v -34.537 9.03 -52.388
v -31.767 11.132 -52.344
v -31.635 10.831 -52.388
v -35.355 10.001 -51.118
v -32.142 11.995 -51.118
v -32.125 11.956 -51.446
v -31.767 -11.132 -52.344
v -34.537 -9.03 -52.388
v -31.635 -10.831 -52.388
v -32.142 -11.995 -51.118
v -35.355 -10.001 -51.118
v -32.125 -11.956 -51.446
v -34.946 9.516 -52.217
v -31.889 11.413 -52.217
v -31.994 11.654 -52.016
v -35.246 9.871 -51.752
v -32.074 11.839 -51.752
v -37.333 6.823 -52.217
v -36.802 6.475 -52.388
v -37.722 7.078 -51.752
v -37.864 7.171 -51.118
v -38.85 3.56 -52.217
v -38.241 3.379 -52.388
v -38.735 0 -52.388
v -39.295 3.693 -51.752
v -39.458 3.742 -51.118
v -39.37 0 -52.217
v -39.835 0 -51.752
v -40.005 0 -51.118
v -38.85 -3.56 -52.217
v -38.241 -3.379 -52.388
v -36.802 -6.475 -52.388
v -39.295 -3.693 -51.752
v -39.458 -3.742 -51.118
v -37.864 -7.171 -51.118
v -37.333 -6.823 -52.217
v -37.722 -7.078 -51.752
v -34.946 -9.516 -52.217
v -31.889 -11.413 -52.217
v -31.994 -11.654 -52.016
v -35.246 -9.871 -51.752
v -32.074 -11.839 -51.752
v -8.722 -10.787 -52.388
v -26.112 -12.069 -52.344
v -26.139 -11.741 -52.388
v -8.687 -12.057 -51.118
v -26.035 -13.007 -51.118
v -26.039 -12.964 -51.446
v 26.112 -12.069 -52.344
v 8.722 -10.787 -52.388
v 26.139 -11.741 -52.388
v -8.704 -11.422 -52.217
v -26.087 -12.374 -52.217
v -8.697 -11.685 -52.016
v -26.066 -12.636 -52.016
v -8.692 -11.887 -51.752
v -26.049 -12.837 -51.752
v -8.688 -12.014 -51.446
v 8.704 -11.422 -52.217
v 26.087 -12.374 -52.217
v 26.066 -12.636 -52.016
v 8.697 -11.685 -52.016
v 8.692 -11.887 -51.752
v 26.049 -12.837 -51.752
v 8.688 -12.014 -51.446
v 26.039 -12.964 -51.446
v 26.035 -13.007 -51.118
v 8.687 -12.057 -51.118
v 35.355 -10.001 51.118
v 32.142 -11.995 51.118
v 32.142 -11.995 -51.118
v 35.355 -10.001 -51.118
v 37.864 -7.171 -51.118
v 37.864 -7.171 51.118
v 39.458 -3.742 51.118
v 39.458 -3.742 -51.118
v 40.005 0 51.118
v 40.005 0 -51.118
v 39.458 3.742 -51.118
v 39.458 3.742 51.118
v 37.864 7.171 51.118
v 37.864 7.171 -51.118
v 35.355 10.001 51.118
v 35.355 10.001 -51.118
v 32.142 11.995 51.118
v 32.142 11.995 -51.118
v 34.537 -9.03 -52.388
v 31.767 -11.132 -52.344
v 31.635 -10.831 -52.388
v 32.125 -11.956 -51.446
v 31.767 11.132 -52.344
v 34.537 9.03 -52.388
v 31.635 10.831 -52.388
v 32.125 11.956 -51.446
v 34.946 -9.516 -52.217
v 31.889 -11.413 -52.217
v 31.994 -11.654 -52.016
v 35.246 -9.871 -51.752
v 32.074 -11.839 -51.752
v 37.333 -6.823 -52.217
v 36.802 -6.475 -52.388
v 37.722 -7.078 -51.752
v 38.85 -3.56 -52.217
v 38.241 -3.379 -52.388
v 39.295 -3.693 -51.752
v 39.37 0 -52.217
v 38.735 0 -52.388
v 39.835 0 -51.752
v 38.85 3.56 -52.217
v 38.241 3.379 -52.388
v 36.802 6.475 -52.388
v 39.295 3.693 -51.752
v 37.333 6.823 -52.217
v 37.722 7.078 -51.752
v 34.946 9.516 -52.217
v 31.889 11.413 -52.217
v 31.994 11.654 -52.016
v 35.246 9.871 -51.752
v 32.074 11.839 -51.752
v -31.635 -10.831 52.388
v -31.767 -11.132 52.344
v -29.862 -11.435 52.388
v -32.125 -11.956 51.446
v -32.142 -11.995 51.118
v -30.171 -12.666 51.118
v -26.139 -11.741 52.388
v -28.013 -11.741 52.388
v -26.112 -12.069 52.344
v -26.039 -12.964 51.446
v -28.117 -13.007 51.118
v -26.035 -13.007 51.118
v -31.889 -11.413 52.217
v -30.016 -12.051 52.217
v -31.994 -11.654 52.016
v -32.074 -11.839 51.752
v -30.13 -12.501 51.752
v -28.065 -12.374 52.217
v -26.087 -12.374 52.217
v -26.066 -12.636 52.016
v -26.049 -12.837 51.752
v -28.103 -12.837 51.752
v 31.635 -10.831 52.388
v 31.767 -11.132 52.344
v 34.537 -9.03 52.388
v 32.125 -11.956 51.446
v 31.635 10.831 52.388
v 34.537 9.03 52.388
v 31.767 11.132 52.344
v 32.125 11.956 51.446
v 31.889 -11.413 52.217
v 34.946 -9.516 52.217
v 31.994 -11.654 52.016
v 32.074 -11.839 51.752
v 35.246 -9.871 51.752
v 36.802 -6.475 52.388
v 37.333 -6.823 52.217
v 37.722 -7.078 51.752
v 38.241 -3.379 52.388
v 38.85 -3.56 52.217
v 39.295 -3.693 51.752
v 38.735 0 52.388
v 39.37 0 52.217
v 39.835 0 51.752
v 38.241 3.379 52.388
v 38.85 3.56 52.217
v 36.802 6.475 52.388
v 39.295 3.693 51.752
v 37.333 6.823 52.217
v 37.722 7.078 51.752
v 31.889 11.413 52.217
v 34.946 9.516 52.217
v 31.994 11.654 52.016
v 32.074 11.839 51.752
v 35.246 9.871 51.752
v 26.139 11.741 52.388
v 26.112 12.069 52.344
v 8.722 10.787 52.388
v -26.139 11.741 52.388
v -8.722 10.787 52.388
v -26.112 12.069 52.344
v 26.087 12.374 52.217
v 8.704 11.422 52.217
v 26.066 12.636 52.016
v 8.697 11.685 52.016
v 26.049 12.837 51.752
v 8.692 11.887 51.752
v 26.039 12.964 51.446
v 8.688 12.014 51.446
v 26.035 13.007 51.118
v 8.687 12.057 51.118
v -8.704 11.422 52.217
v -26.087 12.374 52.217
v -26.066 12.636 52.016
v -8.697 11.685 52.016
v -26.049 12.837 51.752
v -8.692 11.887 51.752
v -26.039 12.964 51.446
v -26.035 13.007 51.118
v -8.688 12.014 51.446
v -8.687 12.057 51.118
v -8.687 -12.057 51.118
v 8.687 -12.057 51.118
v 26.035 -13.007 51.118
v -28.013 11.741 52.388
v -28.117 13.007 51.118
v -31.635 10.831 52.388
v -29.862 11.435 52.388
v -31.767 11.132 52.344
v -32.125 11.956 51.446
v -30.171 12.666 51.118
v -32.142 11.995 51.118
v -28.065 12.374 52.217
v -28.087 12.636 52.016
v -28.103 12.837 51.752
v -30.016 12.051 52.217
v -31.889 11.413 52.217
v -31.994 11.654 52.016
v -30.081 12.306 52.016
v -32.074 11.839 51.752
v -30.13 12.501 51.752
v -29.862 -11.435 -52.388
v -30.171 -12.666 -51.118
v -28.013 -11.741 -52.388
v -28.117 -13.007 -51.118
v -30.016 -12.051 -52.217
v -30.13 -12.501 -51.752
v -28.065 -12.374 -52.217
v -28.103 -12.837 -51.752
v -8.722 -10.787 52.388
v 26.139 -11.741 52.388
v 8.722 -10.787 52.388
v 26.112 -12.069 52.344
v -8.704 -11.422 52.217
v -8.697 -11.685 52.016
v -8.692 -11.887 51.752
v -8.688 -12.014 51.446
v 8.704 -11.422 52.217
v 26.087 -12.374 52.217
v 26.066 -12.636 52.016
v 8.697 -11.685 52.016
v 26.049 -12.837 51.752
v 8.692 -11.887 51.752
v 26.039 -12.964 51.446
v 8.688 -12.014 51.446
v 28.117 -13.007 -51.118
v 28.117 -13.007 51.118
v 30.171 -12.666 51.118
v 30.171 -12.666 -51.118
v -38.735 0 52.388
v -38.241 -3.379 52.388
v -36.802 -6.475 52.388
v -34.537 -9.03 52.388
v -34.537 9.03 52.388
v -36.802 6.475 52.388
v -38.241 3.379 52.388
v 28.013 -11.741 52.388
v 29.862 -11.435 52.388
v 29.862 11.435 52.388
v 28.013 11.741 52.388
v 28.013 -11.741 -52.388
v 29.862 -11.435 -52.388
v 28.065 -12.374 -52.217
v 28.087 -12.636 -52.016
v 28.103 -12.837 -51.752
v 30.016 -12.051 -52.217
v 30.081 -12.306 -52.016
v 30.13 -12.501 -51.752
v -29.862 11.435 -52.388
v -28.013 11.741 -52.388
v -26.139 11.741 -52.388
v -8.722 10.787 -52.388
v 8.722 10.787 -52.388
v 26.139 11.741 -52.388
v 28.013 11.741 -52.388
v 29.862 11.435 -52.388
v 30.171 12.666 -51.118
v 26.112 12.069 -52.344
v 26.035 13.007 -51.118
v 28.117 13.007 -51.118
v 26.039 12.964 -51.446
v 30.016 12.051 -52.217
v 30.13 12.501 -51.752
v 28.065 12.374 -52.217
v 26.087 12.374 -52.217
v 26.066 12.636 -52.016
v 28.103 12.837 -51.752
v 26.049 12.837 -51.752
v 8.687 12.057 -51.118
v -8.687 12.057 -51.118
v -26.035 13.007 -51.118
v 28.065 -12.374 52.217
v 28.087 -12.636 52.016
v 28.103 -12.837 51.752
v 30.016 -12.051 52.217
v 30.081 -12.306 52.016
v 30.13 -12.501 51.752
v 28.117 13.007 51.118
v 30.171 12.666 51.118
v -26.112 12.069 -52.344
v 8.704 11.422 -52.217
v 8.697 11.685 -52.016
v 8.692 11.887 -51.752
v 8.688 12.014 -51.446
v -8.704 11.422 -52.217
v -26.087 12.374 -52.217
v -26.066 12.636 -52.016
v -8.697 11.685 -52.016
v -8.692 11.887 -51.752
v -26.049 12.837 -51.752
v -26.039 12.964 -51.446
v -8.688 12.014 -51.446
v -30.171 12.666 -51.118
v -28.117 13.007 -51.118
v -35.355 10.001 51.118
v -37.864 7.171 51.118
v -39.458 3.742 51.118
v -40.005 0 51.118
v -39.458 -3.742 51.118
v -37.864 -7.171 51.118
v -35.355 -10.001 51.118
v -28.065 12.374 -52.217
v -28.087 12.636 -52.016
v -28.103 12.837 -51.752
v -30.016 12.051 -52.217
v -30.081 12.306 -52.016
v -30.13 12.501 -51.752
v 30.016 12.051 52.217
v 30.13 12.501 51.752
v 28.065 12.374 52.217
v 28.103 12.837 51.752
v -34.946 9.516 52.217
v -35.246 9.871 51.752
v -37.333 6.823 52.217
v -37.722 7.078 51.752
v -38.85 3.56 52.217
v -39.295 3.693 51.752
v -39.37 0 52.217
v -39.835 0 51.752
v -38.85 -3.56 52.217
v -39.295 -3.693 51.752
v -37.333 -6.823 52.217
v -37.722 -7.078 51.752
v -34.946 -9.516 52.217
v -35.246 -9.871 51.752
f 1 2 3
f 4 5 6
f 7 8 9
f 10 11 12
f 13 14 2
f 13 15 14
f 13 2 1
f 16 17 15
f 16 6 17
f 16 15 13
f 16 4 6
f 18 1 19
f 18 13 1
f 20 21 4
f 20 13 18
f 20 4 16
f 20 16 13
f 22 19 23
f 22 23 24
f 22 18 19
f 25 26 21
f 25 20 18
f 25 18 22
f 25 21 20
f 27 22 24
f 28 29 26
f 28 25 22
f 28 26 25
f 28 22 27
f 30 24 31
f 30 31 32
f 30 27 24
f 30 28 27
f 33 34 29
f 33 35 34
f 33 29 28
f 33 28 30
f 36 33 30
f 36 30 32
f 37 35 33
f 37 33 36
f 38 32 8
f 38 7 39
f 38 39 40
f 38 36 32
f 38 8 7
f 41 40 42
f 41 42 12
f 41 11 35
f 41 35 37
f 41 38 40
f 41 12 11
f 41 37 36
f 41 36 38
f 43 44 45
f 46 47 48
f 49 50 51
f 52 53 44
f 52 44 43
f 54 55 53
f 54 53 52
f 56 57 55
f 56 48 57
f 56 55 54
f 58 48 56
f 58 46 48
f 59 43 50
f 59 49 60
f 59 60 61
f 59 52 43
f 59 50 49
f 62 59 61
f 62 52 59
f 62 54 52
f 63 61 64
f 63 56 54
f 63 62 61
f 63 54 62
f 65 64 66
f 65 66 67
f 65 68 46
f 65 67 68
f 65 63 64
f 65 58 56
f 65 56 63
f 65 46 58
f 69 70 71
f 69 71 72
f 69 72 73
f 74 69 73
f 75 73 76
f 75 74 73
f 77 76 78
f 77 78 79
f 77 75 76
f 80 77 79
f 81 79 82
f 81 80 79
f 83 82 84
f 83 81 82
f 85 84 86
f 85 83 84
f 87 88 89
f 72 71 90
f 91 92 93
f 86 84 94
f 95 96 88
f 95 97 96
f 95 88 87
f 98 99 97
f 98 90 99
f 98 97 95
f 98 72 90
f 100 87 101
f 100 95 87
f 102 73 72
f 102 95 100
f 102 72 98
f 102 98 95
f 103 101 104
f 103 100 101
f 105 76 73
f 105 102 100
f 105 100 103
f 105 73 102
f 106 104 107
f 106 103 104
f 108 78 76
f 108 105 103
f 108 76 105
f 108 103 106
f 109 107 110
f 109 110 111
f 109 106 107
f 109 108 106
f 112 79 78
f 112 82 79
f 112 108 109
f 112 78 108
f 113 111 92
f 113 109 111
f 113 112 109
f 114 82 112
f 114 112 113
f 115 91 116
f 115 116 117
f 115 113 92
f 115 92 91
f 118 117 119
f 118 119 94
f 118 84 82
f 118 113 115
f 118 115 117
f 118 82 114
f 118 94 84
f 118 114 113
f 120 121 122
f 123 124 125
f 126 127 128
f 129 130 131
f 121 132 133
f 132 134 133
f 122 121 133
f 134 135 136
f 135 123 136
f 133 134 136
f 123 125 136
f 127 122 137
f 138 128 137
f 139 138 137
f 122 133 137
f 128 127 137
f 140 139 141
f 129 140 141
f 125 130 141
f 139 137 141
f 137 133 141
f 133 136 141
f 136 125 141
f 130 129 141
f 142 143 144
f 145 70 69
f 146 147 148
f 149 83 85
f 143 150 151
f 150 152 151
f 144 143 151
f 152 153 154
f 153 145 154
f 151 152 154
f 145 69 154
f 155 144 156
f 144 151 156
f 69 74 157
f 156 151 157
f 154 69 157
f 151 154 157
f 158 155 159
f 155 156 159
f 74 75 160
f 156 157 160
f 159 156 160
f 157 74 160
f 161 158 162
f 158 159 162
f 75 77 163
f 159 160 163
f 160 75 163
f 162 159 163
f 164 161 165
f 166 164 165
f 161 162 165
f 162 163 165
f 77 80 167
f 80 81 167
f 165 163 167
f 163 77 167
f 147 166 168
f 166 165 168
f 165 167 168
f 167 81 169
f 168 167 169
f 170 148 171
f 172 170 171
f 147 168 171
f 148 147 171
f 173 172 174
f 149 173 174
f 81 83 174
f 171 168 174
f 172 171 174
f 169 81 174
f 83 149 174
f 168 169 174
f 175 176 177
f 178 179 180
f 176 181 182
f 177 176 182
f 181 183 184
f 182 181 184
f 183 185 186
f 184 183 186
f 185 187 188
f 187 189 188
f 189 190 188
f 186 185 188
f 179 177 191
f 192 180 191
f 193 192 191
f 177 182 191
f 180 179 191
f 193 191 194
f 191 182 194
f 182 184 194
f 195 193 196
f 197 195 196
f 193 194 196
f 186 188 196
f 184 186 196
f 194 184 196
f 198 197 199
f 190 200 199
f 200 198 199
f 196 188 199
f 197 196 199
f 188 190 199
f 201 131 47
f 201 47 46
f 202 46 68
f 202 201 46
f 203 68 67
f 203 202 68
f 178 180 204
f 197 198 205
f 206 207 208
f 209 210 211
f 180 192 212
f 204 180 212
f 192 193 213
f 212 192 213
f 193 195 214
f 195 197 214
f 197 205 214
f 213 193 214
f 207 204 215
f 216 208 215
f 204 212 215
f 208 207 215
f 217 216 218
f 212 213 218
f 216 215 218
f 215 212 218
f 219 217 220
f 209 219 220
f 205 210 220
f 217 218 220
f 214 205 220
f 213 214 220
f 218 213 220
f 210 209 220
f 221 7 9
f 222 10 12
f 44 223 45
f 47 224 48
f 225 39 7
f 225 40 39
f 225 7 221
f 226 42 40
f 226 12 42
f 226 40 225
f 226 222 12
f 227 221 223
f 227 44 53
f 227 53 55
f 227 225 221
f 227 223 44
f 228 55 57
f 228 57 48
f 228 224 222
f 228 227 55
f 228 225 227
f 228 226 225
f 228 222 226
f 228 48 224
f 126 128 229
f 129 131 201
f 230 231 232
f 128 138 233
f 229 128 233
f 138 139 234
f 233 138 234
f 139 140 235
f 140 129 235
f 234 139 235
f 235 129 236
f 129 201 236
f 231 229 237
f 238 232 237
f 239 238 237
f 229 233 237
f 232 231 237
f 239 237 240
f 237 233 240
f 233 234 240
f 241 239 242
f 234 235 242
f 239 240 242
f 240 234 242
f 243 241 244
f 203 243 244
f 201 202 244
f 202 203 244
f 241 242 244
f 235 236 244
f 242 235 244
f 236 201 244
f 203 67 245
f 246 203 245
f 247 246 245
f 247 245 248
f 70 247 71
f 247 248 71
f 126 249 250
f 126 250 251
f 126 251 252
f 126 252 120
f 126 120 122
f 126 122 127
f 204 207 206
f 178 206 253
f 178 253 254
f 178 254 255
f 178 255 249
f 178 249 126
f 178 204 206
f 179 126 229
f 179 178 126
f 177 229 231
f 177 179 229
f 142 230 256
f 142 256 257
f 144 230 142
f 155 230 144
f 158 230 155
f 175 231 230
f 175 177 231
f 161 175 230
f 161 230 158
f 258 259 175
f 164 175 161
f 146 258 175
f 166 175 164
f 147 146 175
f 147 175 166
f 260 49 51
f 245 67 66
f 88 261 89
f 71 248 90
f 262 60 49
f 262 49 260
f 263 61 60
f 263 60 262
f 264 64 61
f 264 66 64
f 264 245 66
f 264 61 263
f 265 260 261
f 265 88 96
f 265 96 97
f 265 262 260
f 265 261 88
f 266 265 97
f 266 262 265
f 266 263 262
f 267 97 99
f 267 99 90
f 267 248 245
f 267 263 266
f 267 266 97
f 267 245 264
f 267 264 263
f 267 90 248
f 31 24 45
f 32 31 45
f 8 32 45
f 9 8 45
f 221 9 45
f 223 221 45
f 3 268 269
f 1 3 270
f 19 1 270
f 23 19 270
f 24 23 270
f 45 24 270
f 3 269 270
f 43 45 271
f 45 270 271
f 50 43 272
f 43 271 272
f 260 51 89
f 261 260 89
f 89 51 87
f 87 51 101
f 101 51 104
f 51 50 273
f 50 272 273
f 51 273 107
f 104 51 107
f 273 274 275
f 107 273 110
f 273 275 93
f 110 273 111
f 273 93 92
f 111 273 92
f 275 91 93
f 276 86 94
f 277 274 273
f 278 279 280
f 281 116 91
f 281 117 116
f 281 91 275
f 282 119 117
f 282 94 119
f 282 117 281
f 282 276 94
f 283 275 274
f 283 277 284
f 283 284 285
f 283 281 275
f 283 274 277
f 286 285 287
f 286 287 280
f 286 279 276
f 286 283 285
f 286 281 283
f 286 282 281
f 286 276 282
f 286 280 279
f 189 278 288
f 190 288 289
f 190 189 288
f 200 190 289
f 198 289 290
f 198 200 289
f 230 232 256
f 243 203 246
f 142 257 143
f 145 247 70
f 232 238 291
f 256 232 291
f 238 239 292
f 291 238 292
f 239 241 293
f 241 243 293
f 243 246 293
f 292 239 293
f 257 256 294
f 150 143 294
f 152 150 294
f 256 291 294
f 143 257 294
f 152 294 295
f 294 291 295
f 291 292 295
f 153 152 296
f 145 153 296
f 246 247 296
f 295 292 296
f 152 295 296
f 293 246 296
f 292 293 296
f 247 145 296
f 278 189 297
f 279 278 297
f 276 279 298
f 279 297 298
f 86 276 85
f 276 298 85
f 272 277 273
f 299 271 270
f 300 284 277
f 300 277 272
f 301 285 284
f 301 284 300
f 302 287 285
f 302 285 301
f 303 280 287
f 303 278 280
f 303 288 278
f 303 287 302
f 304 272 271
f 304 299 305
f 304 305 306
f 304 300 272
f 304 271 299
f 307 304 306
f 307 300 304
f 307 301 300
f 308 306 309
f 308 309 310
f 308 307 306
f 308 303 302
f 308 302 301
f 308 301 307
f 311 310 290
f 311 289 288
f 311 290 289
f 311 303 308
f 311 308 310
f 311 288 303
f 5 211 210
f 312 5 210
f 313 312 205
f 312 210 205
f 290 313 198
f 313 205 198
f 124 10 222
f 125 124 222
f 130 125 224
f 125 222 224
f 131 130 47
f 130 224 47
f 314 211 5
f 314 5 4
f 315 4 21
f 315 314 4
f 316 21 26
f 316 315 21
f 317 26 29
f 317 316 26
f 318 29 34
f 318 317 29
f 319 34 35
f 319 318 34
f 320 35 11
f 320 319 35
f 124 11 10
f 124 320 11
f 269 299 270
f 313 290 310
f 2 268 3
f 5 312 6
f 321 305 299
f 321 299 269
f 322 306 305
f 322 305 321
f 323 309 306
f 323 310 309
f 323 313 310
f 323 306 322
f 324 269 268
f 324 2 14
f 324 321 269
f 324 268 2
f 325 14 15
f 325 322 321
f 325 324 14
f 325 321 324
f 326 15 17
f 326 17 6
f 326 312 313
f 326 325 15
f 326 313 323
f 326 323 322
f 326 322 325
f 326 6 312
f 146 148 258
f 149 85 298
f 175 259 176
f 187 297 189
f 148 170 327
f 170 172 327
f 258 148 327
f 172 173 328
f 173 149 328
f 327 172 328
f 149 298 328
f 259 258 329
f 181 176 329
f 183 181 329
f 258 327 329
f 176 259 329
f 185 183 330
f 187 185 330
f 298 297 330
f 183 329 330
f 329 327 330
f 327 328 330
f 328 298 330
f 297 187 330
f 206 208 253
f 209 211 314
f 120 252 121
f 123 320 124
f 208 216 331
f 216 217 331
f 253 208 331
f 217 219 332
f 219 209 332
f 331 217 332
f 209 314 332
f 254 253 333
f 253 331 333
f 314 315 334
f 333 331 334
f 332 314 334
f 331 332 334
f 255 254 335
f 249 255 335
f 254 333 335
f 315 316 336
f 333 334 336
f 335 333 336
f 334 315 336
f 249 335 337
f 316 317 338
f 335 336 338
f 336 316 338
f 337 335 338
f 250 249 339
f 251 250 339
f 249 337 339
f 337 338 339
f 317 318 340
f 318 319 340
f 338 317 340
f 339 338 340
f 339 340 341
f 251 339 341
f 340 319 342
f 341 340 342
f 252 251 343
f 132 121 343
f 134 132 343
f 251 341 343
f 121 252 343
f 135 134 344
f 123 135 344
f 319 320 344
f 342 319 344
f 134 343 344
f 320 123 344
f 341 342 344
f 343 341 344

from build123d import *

# Parameters (mm, degrees)
BOSS_EXTRUDE1_DEPTH = 52.3875
FILLET1_R           = 12.7
FILLET2_R           = 1.27


with BuildPart() as part:
    # Sketch1 → Boss-Extrude1 (new, symmetric)
    with BuildSketch(Plane.XY):
        with BuildLine():
            ThreePointArc((-26.924, -13.081), (0, -11.938), (26.924, -13.081))
            ThreePointArc((26.924, -13.081), (40.005, 0), (26.924, 13.081))
            ThreePointArc((26.924, 13.081), (0, 11.938), (-26.924, 13.081))
            ThreePointArc((-26.924, 13.081), (-40.005, 0), (-26.924, -13.081))
        make_face()
    extrude(amount=BOSS_EXTRUDE1_DEPTH, both=True)

    # Fillet1
    # the kernel refuses this fillet: 12.7 mm, written as the material it takes off along each edge
    with BuildSketch(Plane(origin=(-26.924, 13.081, 65.711996683), x_dir=(-0.9790285886887711, -0.2037229062478567, 0), z_dir=(0, 0, -1)), Plane(origin=(-26.924, -13.081, -65.711996683), x_dir=(-0.9790285886887613, 0.20372290624790387, 0), z_dir=(0, 0, 1))) as fillet1_piece_1:
        with BuildLine():
            CenterArc((2.742517764, -12.433663076), FILLET1_R, 78.245250593, 28.210444168)
            ThreePointArc((-0.855059891, -0.253866895), (-0.427440847, -0.127233545), (0, 0))
            ThreePointArc((0, 0), (2.664899337, 0.274327031), (5.329798673, 0))
        make_face()
    extrude(amount=131.423993366, mode=Mode.SUBTRACT)
    with BuildSketch(Plane(origin=(26.924, 13.081, 65.711996683), x_dir=(-0.9965199988038926, -0.08335401600336978, 0), z_dir=(0, 0, -1))) as fillet1_piece_2:
        with BuildLine():
            CenterArc((0.909779676, -12.699987485), FILLET1_R, 90.08043566, 28.210444168)
            ThreePointArc((-5.109360575, -1.516966845), (-2.632759224, -0.495502435), (0, 0))
            ThreePointArc((0, 0), (0.445975285, -0.000313045), (0.891950569, 0))
        make_face()
    extrude(amount=131.423993366, mode=Mode.SUBTRACT)
    with BuildSketch(Plane(origin=(26.924, -13.081, -65.711996683), x_dir=(0.979028588688819, 0.20372290624762615, 0), z_dir=(0, 0, 1))) as fillet1_piece_3:
        with BuildLine():
            CenterArc((2.742517764, 12.433663076), FILLET1_R, 253.544305239, 28.210444168)
            ThreePointArc((-0.855059891, 0.253866895), (-0.427440847, 0.127233545), (0, 0))
            ThreePointArc((0, 0), (2.664899337, -0.274327031), (5.329798673, 0))
        make_face()
    extrude(amount=131.423993366, mode=Mode.SUBTRACT)

    # Fillet2
    fillet2_edges = [part.edges().sort_by_distance(p)[0] for p in [
        (40.005, 0, -52.3875),
        (40.005, 0, 52.3875),
        (-40.005, 0, -52.3875),
        (0, 11.938, -52.3875),
        (0, -11.938, -52.3875),
        (29.15115627, 12.878686287, -52.3875),
        (-29.15115627, 12.878686287, -52.3875),
        (-29.15115627, -12.878686287, -52.3875),
        (29.15115627, -12.878686287, -52.3875),
        (0, -11.938, 52.3875),
        (-40.005, 0, 52.3875),
        (0, 11.938, 52.3875),
        (29.15115627, 12.878686287, 52.3875),
        (-29.15115627, 12.878686287, 52.3875),
        (-29.15115627, -12.878686287, 52.3875),
        (29.15115627, -12.878686287, 52.3875),
    ]]
    fillet(fillet2_edges, radius=FILLET2_R)


solid = part.part
